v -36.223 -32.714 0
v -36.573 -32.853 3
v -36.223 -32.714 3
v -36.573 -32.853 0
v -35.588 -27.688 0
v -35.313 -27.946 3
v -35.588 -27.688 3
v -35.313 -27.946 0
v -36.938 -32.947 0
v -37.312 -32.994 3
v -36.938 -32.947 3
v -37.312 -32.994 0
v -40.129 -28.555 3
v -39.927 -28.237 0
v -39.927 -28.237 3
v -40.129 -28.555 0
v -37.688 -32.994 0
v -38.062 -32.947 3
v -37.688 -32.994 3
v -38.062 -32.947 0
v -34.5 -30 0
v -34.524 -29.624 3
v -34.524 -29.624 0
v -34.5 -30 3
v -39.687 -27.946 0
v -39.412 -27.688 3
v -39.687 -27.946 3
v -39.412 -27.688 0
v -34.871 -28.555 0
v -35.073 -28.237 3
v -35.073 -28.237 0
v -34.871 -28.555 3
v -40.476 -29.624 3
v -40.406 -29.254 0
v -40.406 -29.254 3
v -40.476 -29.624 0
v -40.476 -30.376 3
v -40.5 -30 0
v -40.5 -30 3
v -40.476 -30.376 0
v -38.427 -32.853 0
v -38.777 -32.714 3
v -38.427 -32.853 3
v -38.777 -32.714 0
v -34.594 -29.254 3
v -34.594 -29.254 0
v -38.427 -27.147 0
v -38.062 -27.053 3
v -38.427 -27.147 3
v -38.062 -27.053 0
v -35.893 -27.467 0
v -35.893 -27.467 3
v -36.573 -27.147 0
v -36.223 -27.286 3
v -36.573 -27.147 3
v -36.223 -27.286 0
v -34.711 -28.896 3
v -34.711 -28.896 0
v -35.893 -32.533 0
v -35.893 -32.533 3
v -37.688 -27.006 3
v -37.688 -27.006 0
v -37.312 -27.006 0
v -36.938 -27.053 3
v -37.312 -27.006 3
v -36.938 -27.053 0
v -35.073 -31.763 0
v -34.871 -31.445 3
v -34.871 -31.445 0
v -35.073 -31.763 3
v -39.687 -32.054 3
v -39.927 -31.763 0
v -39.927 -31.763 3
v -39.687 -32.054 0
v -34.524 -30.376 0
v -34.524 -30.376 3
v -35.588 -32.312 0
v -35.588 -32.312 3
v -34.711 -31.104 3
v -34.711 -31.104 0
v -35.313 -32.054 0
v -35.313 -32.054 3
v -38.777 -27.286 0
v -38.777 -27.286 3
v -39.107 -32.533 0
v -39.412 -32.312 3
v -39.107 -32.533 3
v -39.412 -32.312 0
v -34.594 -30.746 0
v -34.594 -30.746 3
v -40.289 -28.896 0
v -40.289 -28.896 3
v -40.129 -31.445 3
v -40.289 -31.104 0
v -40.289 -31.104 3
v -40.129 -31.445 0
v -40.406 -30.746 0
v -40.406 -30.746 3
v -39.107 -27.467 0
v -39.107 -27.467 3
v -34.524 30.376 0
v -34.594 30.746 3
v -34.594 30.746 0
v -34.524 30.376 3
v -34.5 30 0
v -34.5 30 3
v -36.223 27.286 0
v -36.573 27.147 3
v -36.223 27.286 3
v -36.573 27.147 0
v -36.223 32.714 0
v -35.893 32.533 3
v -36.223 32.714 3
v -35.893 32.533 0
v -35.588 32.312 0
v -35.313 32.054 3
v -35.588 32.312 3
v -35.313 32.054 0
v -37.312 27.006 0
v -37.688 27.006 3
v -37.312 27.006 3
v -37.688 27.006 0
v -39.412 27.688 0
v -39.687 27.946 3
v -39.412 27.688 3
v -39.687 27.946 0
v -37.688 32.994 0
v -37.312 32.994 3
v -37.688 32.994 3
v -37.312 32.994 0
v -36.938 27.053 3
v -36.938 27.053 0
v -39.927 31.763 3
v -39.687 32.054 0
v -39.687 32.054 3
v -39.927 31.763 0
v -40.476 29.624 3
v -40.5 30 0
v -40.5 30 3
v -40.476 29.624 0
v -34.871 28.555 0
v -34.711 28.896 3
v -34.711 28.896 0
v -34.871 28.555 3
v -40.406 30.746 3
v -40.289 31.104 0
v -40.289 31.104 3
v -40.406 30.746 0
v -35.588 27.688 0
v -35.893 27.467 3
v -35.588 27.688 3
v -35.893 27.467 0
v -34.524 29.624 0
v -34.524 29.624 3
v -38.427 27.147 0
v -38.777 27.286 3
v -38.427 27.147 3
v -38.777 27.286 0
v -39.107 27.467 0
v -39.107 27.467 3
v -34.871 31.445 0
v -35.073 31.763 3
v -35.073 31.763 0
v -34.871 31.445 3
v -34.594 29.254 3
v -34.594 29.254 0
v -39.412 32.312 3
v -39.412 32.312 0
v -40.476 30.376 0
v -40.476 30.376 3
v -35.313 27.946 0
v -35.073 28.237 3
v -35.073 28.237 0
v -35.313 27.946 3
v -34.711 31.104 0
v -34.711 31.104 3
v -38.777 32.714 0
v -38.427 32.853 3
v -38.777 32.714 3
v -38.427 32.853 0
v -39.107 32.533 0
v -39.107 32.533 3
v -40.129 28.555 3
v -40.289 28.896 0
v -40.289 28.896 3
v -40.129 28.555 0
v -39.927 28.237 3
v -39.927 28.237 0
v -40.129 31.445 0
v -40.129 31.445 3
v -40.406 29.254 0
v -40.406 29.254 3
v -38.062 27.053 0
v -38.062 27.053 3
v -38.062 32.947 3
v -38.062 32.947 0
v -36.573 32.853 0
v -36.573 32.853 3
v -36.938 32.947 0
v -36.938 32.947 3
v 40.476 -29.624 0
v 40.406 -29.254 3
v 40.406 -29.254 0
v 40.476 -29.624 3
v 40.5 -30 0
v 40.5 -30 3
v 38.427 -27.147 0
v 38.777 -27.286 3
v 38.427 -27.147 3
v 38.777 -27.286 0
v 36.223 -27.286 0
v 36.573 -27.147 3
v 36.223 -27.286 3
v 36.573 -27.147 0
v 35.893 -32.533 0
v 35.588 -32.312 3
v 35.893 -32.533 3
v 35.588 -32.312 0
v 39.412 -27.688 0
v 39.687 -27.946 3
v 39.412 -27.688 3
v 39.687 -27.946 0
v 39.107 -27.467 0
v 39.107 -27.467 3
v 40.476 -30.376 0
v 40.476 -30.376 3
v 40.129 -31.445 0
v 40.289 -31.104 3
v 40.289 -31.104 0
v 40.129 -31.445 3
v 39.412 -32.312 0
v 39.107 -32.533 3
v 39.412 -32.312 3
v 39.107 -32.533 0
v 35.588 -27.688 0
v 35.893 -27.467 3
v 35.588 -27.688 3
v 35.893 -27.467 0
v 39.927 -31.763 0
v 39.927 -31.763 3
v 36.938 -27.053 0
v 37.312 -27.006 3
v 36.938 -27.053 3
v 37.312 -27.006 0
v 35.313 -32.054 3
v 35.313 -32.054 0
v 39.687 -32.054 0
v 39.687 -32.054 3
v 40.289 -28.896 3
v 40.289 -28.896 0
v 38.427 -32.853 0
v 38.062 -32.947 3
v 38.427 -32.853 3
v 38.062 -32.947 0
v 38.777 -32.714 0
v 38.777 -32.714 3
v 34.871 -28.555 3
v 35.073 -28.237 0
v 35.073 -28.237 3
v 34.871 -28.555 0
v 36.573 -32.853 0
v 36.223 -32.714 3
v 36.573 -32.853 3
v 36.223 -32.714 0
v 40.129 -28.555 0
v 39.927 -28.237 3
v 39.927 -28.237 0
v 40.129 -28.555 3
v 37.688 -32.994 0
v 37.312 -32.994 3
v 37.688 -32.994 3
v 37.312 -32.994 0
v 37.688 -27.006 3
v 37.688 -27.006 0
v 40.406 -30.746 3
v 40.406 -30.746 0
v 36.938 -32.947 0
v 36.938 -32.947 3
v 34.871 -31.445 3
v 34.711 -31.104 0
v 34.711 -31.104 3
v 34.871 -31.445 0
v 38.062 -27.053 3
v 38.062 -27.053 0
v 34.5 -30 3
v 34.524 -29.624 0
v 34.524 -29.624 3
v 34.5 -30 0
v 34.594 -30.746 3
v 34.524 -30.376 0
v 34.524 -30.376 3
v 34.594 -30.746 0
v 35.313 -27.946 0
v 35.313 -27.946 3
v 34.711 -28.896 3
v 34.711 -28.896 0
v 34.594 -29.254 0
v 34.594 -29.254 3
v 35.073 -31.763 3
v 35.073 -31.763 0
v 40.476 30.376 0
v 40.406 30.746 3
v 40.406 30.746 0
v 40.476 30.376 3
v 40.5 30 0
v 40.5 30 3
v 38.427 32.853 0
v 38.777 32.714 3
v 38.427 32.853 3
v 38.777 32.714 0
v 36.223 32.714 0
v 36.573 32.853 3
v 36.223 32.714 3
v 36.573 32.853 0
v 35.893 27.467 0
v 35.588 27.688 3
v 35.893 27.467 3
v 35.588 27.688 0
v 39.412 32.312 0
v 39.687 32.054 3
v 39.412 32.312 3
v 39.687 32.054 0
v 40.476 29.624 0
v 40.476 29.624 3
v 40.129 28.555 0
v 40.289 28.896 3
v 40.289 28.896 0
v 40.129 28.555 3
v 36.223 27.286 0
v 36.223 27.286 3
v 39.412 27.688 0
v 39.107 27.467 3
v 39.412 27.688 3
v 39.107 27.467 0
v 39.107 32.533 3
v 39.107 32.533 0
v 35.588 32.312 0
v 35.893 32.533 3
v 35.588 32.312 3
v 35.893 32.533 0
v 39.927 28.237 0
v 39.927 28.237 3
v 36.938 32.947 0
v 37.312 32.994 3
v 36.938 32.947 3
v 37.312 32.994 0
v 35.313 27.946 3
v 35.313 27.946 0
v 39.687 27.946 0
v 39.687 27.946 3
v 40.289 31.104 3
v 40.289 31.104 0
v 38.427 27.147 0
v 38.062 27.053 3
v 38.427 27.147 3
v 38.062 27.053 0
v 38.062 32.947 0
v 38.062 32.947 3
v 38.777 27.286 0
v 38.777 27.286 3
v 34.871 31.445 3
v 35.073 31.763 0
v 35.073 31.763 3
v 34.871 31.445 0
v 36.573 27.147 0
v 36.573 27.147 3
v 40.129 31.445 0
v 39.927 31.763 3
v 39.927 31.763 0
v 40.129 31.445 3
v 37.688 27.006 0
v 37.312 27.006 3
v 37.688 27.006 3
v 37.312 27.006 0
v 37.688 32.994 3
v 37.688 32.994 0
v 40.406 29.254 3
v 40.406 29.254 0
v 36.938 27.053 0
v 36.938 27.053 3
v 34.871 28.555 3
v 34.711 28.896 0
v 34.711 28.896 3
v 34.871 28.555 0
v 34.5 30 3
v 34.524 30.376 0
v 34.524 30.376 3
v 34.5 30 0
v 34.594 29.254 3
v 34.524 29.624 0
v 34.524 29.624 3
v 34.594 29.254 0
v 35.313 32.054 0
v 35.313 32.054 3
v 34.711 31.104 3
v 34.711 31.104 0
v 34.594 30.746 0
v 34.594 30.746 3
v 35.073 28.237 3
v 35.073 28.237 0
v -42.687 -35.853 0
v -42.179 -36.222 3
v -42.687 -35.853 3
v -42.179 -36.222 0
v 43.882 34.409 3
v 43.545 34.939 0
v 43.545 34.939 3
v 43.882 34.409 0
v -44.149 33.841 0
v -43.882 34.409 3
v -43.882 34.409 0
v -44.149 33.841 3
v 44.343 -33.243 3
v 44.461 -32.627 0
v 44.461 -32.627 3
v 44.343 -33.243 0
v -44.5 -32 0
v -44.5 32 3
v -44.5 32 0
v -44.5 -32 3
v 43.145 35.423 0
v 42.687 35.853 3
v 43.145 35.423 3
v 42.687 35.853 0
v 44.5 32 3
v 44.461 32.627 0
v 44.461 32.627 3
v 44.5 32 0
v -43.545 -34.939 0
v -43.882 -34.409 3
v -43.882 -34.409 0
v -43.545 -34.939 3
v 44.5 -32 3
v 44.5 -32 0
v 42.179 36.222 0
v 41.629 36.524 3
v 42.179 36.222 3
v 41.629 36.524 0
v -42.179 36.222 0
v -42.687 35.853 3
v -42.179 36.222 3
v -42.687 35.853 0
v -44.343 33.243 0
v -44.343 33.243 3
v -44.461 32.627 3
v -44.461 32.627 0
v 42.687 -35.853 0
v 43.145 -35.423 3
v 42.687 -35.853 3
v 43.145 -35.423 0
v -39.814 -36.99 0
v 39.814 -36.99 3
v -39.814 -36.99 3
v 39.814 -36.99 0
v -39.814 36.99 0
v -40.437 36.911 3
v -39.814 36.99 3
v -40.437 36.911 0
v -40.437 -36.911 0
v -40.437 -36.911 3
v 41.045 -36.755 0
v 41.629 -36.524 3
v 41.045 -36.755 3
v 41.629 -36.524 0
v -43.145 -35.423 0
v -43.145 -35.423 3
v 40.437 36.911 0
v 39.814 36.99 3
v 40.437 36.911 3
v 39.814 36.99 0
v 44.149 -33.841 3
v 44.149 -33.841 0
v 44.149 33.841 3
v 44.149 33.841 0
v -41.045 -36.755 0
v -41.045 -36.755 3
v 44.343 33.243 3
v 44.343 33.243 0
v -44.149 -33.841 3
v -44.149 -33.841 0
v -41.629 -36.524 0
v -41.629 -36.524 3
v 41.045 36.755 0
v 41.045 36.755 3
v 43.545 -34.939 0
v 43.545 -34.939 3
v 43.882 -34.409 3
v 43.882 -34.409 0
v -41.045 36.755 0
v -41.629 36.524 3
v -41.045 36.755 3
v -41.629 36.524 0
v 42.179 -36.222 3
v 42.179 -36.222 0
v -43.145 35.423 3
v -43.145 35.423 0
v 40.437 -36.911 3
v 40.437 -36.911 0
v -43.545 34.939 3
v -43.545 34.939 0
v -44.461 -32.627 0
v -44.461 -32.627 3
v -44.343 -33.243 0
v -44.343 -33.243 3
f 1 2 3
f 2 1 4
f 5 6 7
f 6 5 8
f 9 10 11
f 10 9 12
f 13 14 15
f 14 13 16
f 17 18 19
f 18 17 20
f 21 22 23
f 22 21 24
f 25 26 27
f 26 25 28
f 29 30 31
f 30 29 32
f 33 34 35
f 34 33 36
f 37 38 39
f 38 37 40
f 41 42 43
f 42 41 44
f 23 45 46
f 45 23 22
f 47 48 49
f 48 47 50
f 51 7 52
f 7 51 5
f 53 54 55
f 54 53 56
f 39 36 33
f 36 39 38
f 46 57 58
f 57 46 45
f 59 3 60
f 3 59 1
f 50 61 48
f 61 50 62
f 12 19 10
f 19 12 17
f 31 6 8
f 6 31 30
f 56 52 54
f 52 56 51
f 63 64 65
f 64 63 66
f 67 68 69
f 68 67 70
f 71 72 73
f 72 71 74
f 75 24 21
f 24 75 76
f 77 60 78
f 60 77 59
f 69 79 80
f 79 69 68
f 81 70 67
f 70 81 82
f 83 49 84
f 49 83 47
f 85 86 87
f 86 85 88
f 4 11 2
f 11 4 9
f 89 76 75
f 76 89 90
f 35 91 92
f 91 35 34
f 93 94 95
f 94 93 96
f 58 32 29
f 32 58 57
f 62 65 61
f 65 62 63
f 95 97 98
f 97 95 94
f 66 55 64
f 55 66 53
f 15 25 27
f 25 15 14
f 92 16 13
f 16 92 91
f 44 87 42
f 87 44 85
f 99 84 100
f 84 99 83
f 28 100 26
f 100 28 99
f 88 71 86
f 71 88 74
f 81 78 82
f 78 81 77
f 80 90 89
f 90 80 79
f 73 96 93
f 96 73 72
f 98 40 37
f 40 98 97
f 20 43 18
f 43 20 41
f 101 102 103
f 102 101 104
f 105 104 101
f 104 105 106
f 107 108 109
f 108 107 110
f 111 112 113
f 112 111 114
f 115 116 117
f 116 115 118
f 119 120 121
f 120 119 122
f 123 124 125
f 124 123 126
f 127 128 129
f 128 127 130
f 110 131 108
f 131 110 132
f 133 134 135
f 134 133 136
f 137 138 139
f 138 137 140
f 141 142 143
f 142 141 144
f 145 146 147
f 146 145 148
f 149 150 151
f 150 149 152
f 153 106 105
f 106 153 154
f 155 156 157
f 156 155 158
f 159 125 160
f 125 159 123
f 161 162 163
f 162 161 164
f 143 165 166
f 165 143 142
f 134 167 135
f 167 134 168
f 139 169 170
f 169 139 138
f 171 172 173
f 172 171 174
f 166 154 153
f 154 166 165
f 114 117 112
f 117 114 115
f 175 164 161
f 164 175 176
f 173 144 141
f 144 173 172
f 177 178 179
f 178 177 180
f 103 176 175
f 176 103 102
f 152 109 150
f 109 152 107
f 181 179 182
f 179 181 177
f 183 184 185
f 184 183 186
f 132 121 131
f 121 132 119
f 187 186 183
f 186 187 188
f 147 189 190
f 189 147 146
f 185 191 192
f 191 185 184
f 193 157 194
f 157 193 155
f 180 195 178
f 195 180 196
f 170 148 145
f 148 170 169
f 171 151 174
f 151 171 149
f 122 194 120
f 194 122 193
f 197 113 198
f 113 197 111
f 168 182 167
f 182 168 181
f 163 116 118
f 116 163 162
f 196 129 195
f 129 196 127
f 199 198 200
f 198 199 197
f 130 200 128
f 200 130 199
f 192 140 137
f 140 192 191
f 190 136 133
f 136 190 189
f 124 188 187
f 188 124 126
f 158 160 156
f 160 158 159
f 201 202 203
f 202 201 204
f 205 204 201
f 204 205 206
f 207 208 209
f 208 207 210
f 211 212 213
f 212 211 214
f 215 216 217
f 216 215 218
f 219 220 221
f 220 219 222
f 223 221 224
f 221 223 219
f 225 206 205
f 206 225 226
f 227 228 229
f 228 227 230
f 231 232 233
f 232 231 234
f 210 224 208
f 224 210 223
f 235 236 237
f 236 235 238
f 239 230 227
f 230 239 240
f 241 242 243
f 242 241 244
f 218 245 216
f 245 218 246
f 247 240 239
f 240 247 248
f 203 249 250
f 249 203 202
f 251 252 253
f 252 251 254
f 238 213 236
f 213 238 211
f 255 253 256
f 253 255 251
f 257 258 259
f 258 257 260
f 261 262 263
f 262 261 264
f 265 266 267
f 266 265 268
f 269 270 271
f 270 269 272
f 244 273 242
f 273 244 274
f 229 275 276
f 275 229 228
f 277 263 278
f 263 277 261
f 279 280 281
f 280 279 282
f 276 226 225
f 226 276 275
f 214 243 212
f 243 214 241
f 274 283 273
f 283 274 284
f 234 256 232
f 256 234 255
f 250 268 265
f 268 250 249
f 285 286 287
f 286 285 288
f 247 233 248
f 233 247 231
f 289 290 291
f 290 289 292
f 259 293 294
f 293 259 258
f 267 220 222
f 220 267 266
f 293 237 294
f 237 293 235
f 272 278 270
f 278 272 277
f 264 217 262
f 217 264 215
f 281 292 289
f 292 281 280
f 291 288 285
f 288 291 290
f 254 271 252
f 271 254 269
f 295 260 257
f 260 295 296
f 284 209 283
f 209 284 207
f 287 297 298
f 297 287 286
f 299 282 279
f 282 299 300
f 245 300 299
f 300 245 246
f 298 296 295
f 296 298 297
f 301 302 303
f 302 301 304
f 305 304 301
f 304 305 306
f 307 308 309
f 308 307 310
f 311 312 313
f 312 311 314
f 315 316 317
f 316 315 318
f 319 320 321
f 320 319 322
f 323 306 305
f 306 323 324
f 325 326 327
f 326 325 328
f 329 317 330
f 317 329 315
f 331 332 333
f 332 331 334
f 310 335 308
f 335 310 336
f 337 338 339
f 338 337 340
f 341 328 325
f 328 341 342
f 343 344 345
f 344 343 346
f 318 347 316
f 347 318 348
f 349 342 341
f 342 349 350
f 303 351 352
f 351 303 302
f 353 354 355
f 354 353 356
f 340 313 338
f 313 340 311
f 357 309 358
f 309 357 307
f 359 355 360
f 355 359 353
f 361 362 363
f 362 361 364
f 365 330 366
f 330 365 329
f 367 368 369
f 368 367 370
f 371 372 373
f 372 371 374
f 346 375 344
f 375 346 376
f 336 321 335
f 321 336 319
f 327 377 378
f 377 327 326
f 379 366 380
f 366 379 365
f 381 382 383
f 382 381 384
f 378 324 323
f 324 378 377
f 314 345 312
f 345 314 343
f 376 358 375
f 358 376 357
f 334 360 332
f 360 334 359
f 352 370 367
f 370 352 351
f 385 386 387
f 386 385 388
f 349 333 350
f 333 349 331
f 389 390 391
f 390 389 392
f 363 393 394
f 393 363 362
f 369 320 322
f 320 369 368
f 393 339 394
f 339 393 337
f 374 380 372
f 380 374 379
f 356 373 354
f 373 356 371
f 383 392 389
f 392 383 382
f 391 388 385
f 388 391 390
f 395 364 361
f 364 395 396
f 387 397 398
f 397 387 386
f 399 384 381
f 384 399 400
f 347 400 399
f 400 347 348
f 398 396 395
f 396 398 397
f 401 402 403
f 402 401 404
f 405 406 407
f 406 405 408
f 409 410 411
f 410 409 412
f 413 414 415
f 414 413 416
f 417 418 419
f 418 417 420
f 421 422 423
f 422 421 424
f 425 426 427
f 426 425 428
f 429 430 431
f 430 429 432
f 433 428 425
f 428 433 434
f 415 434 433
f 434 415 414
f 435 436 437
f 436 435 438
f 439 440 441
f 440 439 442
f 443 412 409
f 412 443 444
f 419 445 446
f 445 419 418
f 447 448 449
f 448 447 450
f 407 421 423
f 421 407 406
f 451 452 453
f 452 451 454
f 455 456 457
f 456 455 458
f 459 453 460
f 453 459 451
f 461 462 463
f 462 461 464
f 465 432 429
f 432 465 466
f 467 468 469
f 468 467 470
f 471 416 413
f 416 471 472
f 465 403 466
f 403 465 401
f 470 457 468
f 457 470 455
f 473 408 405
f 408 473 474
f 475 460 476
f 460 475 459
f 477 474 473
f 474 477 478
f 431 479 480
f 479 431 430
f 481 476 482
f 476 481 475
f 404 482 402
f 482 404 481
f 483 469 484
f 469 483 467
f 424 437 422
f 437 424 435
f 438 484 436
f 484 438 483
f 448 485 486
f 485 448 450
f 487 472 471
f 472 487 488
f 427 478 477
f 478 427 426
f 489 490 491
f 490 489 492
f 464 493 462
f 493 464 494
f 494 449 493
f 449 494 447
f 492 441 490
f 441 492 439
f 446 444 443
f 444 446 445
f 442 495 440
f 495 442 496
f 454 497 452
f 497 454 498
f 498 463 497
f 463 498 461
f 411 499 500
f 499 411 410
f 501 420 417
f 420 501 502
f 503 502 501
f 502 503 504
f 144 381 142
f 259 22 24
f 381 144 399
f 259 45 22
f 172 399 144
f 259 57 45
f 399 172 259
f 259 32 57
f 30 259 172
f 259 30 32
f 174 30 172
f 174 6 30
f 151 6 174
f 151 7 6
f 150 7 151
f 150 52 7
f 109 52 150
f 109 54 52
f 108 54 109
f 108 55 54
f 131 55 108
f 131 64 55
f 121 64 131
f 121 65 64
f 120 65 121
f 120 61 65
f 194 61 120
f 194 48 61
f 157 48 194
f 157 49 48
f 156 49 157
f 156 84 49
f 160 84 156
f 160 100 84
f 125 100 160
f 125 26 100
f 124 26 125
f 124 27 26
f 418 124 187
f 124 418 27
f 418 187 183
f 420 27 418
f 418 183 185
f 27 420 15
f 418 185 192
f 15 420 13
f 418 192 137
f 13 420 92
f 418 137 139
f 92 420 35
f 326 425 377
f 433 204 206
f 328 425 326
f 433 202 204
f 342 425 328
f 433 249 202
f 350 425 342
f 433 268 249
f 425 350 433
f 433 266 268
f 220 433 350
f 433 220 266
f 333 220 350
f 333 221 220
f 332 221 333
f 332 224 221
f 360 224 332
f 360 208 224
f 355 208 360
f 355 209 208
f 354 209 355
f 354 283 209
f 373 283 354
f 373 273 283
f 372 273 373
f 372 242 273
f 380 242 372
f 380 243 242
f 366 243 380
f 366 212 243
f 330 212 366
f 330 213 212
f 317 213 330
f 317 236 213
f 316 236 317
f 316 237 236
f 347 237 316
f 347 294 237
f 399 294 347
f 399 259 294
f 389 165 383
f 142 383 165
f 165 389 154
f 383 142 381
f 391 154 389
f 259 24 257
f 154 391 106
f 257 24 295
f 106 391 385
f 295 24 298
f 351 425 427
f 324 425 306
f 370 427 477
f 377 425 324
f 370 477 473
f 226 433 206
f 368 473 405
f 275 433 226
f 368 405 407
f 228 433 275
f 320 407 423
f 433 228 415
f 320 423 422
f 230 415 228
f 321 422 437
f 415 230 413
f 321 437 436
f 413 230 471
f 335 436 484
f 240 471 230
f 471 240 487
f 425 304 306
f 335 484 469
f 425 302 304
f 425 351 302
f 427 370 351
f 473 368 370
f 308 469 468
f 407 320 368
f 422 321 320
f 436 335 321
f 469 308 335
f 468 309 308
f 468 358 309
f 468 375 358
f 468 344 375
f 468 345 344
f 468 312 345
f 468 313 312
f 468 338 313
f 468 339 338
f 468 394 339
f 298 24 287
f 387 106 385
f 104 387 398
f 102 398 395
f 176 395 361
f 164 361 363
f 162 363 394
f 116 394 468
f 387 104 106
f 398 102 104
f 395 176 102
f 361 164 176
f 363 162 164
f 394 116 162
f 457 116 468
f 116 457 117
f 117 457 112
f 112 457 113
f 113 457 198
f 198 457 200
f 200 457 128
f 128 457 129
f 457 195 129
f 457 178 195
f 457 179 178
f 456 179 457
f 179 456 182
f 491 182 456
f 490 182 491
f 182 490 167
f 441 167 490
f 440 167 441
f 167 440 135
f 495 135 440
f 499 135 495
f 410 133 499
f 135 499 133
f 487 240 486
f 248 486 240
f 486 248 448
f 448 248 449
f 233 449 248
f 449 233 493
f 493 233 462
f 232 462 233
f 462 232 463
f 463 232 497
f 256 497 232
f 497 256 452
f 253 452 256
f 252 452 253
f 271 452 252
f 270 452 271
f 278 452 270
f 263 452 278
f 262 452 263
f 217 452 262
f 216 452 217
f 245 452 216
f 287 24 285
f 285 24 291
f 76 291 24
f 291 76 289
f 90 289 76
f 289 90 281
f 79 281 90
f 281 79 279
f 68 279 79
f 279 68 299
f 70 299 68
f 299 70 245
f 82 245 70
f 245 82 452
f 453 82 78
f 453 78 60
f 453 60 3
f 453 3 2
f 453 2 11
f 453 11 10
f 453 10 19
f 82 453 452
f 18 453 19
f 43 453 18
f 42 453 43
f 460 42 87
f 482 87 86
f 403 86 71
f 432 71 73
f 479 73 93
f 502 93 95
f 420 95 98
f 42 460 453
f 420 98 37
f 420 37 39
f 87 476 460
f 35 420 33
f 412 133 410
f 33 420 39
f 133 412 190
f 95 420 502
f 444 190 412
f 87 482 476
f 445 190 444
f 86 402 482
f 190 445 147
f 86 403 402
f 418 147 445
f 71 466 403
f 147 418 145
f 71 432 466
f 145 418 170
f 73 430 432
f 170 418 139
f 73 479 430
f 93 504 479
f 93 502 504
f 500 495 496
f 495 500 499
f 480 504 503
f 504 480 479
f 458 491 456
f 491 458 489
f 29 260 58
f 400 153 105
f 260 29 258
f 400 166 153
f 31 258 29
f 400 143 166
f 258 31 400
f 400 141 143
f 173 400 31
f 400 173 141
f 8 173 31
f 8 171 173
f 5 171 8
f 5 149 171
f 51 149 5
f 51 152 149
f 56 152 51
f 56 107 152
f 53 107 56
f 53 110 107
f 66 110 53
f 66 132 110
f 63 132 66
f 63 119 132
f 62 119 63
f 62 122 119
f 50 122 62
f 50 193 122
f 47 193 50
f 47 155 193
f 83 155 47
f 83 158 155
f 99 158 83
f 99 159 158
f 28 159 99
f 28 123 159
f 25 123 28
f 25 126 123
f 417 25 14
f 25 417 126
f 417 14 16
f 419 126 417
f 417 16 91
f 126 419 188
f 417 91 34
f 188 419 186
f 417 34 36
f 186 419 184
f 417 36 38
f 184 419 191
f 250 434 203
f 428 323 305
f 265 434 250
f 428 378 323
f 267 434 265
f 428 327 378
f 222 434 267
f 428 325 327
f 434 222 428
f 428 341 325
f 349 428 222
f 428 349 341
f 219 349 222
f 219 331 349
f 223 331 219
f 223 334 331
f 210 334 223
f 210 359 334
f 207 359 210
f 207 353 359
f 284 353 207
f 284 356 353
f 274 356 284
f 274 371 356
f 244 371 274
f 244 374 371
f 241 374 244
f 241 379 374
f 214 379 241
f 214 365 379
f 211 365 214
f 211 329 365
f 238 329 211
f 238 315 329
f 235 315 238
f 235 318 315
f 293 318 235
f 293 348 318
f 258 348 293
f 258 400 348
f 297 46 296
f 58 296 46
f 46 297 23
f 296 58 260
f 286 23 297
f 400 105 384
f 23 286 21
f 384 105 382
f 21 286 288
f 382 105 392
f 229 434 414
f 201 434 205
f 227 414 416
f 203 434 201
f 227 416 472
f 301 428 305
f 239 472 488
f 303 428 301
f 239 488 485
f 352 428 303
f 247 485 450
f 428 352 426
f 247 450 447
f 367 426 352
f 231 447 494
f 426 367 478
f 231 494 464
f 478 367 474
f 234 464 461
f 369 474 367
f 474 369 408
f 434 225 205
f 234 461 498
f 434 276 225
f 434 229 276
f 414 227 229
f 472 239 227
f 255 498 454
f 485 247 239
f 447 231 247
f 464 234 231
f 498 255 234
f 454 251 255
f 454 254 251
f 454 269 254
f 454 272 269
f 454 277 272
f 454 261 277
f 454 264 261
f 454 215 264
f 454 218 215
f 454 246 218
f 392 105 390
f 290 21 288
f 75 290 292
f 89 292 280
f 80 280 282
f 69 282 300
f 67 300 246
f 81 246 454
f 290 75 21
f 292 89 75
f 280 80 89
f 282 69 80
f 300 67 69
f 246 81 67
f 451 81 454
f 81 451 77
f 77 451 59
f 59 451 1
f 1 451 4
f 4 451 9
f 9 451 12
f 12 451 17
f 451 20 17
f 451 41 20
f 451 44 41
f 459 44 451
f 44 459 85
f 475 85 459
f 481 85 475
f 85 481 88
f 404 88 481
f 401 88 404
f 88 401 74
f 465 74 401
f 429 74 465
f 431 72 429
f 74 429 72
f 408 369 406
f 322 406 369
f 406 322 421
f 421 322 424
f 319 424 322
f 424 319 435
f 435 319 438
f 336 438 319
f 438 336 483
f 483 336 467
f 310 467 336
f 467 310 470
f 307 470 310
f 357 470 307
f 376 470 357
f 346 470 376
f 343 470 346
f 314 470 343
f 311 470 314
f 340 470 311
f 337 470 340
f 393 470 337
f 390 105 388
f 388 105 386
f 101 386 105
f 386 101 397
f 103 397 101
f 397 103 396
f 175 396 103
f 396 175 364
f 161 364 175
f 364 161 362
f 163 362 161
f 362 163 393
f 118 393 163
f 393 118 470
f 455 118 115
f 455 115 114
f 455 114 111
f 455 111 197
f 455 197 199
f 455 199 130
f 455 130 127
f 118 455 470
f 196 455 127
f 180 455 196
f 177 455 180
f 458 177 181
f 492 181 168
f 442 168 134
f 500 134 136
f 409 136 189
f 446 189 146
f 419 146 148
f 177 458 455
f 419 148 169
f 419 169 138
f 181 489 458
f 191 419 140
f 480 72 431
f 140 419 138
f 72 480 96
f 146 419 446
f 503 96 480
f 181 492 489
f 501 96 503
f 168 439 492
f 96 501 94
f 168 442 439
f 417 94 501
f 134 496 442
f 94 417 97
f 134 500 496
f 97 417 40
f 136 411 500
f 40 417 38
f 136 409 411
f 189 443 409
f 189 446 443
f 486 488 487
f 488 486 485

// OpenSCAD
$fn = 50;


difference() {
	union() {
		hull() {
			translate(v = [-39.5000000000, 32.0000000000, 0]) {
				cylinder(h = 3, r = 5);
			}
			translate(v = [39.5000000000, 32.0000000000, 0]) {
				cylinder(h = 3, r = 5);
			}
			translate(v = [-39.5000000000, -32.0000000000, 0]) {
				cylinder(h = 3, r = 5);
			}
			translate(v = [39.5000000000, -32.0000000000, 0]) {
				cylinder(h = 3, r = 5);
			}
		}
	}
	union() {
		translate(v = [-37.5000000000, -30.0000000000, -100.0000000000]) {
			cylinder(h = 200, r = 3.0000000000);
		}
		translate(v = [-37.5000000000, 30.0000000000, -100.0000000000]) {
			cylinder(h = 200, r = 3.0000000000);
		}
		translate(v = [37.5000000000, -30.0000000000, -100.0000000000]) {
			cylinder(h = 200, r = 3.0000000000);
		}
		translate(v = [37.5000000000, 30.0000000000, -100.0000000000]) {
			cylinder(h = 200, r = 3.0000000000);
		}
	}
}
